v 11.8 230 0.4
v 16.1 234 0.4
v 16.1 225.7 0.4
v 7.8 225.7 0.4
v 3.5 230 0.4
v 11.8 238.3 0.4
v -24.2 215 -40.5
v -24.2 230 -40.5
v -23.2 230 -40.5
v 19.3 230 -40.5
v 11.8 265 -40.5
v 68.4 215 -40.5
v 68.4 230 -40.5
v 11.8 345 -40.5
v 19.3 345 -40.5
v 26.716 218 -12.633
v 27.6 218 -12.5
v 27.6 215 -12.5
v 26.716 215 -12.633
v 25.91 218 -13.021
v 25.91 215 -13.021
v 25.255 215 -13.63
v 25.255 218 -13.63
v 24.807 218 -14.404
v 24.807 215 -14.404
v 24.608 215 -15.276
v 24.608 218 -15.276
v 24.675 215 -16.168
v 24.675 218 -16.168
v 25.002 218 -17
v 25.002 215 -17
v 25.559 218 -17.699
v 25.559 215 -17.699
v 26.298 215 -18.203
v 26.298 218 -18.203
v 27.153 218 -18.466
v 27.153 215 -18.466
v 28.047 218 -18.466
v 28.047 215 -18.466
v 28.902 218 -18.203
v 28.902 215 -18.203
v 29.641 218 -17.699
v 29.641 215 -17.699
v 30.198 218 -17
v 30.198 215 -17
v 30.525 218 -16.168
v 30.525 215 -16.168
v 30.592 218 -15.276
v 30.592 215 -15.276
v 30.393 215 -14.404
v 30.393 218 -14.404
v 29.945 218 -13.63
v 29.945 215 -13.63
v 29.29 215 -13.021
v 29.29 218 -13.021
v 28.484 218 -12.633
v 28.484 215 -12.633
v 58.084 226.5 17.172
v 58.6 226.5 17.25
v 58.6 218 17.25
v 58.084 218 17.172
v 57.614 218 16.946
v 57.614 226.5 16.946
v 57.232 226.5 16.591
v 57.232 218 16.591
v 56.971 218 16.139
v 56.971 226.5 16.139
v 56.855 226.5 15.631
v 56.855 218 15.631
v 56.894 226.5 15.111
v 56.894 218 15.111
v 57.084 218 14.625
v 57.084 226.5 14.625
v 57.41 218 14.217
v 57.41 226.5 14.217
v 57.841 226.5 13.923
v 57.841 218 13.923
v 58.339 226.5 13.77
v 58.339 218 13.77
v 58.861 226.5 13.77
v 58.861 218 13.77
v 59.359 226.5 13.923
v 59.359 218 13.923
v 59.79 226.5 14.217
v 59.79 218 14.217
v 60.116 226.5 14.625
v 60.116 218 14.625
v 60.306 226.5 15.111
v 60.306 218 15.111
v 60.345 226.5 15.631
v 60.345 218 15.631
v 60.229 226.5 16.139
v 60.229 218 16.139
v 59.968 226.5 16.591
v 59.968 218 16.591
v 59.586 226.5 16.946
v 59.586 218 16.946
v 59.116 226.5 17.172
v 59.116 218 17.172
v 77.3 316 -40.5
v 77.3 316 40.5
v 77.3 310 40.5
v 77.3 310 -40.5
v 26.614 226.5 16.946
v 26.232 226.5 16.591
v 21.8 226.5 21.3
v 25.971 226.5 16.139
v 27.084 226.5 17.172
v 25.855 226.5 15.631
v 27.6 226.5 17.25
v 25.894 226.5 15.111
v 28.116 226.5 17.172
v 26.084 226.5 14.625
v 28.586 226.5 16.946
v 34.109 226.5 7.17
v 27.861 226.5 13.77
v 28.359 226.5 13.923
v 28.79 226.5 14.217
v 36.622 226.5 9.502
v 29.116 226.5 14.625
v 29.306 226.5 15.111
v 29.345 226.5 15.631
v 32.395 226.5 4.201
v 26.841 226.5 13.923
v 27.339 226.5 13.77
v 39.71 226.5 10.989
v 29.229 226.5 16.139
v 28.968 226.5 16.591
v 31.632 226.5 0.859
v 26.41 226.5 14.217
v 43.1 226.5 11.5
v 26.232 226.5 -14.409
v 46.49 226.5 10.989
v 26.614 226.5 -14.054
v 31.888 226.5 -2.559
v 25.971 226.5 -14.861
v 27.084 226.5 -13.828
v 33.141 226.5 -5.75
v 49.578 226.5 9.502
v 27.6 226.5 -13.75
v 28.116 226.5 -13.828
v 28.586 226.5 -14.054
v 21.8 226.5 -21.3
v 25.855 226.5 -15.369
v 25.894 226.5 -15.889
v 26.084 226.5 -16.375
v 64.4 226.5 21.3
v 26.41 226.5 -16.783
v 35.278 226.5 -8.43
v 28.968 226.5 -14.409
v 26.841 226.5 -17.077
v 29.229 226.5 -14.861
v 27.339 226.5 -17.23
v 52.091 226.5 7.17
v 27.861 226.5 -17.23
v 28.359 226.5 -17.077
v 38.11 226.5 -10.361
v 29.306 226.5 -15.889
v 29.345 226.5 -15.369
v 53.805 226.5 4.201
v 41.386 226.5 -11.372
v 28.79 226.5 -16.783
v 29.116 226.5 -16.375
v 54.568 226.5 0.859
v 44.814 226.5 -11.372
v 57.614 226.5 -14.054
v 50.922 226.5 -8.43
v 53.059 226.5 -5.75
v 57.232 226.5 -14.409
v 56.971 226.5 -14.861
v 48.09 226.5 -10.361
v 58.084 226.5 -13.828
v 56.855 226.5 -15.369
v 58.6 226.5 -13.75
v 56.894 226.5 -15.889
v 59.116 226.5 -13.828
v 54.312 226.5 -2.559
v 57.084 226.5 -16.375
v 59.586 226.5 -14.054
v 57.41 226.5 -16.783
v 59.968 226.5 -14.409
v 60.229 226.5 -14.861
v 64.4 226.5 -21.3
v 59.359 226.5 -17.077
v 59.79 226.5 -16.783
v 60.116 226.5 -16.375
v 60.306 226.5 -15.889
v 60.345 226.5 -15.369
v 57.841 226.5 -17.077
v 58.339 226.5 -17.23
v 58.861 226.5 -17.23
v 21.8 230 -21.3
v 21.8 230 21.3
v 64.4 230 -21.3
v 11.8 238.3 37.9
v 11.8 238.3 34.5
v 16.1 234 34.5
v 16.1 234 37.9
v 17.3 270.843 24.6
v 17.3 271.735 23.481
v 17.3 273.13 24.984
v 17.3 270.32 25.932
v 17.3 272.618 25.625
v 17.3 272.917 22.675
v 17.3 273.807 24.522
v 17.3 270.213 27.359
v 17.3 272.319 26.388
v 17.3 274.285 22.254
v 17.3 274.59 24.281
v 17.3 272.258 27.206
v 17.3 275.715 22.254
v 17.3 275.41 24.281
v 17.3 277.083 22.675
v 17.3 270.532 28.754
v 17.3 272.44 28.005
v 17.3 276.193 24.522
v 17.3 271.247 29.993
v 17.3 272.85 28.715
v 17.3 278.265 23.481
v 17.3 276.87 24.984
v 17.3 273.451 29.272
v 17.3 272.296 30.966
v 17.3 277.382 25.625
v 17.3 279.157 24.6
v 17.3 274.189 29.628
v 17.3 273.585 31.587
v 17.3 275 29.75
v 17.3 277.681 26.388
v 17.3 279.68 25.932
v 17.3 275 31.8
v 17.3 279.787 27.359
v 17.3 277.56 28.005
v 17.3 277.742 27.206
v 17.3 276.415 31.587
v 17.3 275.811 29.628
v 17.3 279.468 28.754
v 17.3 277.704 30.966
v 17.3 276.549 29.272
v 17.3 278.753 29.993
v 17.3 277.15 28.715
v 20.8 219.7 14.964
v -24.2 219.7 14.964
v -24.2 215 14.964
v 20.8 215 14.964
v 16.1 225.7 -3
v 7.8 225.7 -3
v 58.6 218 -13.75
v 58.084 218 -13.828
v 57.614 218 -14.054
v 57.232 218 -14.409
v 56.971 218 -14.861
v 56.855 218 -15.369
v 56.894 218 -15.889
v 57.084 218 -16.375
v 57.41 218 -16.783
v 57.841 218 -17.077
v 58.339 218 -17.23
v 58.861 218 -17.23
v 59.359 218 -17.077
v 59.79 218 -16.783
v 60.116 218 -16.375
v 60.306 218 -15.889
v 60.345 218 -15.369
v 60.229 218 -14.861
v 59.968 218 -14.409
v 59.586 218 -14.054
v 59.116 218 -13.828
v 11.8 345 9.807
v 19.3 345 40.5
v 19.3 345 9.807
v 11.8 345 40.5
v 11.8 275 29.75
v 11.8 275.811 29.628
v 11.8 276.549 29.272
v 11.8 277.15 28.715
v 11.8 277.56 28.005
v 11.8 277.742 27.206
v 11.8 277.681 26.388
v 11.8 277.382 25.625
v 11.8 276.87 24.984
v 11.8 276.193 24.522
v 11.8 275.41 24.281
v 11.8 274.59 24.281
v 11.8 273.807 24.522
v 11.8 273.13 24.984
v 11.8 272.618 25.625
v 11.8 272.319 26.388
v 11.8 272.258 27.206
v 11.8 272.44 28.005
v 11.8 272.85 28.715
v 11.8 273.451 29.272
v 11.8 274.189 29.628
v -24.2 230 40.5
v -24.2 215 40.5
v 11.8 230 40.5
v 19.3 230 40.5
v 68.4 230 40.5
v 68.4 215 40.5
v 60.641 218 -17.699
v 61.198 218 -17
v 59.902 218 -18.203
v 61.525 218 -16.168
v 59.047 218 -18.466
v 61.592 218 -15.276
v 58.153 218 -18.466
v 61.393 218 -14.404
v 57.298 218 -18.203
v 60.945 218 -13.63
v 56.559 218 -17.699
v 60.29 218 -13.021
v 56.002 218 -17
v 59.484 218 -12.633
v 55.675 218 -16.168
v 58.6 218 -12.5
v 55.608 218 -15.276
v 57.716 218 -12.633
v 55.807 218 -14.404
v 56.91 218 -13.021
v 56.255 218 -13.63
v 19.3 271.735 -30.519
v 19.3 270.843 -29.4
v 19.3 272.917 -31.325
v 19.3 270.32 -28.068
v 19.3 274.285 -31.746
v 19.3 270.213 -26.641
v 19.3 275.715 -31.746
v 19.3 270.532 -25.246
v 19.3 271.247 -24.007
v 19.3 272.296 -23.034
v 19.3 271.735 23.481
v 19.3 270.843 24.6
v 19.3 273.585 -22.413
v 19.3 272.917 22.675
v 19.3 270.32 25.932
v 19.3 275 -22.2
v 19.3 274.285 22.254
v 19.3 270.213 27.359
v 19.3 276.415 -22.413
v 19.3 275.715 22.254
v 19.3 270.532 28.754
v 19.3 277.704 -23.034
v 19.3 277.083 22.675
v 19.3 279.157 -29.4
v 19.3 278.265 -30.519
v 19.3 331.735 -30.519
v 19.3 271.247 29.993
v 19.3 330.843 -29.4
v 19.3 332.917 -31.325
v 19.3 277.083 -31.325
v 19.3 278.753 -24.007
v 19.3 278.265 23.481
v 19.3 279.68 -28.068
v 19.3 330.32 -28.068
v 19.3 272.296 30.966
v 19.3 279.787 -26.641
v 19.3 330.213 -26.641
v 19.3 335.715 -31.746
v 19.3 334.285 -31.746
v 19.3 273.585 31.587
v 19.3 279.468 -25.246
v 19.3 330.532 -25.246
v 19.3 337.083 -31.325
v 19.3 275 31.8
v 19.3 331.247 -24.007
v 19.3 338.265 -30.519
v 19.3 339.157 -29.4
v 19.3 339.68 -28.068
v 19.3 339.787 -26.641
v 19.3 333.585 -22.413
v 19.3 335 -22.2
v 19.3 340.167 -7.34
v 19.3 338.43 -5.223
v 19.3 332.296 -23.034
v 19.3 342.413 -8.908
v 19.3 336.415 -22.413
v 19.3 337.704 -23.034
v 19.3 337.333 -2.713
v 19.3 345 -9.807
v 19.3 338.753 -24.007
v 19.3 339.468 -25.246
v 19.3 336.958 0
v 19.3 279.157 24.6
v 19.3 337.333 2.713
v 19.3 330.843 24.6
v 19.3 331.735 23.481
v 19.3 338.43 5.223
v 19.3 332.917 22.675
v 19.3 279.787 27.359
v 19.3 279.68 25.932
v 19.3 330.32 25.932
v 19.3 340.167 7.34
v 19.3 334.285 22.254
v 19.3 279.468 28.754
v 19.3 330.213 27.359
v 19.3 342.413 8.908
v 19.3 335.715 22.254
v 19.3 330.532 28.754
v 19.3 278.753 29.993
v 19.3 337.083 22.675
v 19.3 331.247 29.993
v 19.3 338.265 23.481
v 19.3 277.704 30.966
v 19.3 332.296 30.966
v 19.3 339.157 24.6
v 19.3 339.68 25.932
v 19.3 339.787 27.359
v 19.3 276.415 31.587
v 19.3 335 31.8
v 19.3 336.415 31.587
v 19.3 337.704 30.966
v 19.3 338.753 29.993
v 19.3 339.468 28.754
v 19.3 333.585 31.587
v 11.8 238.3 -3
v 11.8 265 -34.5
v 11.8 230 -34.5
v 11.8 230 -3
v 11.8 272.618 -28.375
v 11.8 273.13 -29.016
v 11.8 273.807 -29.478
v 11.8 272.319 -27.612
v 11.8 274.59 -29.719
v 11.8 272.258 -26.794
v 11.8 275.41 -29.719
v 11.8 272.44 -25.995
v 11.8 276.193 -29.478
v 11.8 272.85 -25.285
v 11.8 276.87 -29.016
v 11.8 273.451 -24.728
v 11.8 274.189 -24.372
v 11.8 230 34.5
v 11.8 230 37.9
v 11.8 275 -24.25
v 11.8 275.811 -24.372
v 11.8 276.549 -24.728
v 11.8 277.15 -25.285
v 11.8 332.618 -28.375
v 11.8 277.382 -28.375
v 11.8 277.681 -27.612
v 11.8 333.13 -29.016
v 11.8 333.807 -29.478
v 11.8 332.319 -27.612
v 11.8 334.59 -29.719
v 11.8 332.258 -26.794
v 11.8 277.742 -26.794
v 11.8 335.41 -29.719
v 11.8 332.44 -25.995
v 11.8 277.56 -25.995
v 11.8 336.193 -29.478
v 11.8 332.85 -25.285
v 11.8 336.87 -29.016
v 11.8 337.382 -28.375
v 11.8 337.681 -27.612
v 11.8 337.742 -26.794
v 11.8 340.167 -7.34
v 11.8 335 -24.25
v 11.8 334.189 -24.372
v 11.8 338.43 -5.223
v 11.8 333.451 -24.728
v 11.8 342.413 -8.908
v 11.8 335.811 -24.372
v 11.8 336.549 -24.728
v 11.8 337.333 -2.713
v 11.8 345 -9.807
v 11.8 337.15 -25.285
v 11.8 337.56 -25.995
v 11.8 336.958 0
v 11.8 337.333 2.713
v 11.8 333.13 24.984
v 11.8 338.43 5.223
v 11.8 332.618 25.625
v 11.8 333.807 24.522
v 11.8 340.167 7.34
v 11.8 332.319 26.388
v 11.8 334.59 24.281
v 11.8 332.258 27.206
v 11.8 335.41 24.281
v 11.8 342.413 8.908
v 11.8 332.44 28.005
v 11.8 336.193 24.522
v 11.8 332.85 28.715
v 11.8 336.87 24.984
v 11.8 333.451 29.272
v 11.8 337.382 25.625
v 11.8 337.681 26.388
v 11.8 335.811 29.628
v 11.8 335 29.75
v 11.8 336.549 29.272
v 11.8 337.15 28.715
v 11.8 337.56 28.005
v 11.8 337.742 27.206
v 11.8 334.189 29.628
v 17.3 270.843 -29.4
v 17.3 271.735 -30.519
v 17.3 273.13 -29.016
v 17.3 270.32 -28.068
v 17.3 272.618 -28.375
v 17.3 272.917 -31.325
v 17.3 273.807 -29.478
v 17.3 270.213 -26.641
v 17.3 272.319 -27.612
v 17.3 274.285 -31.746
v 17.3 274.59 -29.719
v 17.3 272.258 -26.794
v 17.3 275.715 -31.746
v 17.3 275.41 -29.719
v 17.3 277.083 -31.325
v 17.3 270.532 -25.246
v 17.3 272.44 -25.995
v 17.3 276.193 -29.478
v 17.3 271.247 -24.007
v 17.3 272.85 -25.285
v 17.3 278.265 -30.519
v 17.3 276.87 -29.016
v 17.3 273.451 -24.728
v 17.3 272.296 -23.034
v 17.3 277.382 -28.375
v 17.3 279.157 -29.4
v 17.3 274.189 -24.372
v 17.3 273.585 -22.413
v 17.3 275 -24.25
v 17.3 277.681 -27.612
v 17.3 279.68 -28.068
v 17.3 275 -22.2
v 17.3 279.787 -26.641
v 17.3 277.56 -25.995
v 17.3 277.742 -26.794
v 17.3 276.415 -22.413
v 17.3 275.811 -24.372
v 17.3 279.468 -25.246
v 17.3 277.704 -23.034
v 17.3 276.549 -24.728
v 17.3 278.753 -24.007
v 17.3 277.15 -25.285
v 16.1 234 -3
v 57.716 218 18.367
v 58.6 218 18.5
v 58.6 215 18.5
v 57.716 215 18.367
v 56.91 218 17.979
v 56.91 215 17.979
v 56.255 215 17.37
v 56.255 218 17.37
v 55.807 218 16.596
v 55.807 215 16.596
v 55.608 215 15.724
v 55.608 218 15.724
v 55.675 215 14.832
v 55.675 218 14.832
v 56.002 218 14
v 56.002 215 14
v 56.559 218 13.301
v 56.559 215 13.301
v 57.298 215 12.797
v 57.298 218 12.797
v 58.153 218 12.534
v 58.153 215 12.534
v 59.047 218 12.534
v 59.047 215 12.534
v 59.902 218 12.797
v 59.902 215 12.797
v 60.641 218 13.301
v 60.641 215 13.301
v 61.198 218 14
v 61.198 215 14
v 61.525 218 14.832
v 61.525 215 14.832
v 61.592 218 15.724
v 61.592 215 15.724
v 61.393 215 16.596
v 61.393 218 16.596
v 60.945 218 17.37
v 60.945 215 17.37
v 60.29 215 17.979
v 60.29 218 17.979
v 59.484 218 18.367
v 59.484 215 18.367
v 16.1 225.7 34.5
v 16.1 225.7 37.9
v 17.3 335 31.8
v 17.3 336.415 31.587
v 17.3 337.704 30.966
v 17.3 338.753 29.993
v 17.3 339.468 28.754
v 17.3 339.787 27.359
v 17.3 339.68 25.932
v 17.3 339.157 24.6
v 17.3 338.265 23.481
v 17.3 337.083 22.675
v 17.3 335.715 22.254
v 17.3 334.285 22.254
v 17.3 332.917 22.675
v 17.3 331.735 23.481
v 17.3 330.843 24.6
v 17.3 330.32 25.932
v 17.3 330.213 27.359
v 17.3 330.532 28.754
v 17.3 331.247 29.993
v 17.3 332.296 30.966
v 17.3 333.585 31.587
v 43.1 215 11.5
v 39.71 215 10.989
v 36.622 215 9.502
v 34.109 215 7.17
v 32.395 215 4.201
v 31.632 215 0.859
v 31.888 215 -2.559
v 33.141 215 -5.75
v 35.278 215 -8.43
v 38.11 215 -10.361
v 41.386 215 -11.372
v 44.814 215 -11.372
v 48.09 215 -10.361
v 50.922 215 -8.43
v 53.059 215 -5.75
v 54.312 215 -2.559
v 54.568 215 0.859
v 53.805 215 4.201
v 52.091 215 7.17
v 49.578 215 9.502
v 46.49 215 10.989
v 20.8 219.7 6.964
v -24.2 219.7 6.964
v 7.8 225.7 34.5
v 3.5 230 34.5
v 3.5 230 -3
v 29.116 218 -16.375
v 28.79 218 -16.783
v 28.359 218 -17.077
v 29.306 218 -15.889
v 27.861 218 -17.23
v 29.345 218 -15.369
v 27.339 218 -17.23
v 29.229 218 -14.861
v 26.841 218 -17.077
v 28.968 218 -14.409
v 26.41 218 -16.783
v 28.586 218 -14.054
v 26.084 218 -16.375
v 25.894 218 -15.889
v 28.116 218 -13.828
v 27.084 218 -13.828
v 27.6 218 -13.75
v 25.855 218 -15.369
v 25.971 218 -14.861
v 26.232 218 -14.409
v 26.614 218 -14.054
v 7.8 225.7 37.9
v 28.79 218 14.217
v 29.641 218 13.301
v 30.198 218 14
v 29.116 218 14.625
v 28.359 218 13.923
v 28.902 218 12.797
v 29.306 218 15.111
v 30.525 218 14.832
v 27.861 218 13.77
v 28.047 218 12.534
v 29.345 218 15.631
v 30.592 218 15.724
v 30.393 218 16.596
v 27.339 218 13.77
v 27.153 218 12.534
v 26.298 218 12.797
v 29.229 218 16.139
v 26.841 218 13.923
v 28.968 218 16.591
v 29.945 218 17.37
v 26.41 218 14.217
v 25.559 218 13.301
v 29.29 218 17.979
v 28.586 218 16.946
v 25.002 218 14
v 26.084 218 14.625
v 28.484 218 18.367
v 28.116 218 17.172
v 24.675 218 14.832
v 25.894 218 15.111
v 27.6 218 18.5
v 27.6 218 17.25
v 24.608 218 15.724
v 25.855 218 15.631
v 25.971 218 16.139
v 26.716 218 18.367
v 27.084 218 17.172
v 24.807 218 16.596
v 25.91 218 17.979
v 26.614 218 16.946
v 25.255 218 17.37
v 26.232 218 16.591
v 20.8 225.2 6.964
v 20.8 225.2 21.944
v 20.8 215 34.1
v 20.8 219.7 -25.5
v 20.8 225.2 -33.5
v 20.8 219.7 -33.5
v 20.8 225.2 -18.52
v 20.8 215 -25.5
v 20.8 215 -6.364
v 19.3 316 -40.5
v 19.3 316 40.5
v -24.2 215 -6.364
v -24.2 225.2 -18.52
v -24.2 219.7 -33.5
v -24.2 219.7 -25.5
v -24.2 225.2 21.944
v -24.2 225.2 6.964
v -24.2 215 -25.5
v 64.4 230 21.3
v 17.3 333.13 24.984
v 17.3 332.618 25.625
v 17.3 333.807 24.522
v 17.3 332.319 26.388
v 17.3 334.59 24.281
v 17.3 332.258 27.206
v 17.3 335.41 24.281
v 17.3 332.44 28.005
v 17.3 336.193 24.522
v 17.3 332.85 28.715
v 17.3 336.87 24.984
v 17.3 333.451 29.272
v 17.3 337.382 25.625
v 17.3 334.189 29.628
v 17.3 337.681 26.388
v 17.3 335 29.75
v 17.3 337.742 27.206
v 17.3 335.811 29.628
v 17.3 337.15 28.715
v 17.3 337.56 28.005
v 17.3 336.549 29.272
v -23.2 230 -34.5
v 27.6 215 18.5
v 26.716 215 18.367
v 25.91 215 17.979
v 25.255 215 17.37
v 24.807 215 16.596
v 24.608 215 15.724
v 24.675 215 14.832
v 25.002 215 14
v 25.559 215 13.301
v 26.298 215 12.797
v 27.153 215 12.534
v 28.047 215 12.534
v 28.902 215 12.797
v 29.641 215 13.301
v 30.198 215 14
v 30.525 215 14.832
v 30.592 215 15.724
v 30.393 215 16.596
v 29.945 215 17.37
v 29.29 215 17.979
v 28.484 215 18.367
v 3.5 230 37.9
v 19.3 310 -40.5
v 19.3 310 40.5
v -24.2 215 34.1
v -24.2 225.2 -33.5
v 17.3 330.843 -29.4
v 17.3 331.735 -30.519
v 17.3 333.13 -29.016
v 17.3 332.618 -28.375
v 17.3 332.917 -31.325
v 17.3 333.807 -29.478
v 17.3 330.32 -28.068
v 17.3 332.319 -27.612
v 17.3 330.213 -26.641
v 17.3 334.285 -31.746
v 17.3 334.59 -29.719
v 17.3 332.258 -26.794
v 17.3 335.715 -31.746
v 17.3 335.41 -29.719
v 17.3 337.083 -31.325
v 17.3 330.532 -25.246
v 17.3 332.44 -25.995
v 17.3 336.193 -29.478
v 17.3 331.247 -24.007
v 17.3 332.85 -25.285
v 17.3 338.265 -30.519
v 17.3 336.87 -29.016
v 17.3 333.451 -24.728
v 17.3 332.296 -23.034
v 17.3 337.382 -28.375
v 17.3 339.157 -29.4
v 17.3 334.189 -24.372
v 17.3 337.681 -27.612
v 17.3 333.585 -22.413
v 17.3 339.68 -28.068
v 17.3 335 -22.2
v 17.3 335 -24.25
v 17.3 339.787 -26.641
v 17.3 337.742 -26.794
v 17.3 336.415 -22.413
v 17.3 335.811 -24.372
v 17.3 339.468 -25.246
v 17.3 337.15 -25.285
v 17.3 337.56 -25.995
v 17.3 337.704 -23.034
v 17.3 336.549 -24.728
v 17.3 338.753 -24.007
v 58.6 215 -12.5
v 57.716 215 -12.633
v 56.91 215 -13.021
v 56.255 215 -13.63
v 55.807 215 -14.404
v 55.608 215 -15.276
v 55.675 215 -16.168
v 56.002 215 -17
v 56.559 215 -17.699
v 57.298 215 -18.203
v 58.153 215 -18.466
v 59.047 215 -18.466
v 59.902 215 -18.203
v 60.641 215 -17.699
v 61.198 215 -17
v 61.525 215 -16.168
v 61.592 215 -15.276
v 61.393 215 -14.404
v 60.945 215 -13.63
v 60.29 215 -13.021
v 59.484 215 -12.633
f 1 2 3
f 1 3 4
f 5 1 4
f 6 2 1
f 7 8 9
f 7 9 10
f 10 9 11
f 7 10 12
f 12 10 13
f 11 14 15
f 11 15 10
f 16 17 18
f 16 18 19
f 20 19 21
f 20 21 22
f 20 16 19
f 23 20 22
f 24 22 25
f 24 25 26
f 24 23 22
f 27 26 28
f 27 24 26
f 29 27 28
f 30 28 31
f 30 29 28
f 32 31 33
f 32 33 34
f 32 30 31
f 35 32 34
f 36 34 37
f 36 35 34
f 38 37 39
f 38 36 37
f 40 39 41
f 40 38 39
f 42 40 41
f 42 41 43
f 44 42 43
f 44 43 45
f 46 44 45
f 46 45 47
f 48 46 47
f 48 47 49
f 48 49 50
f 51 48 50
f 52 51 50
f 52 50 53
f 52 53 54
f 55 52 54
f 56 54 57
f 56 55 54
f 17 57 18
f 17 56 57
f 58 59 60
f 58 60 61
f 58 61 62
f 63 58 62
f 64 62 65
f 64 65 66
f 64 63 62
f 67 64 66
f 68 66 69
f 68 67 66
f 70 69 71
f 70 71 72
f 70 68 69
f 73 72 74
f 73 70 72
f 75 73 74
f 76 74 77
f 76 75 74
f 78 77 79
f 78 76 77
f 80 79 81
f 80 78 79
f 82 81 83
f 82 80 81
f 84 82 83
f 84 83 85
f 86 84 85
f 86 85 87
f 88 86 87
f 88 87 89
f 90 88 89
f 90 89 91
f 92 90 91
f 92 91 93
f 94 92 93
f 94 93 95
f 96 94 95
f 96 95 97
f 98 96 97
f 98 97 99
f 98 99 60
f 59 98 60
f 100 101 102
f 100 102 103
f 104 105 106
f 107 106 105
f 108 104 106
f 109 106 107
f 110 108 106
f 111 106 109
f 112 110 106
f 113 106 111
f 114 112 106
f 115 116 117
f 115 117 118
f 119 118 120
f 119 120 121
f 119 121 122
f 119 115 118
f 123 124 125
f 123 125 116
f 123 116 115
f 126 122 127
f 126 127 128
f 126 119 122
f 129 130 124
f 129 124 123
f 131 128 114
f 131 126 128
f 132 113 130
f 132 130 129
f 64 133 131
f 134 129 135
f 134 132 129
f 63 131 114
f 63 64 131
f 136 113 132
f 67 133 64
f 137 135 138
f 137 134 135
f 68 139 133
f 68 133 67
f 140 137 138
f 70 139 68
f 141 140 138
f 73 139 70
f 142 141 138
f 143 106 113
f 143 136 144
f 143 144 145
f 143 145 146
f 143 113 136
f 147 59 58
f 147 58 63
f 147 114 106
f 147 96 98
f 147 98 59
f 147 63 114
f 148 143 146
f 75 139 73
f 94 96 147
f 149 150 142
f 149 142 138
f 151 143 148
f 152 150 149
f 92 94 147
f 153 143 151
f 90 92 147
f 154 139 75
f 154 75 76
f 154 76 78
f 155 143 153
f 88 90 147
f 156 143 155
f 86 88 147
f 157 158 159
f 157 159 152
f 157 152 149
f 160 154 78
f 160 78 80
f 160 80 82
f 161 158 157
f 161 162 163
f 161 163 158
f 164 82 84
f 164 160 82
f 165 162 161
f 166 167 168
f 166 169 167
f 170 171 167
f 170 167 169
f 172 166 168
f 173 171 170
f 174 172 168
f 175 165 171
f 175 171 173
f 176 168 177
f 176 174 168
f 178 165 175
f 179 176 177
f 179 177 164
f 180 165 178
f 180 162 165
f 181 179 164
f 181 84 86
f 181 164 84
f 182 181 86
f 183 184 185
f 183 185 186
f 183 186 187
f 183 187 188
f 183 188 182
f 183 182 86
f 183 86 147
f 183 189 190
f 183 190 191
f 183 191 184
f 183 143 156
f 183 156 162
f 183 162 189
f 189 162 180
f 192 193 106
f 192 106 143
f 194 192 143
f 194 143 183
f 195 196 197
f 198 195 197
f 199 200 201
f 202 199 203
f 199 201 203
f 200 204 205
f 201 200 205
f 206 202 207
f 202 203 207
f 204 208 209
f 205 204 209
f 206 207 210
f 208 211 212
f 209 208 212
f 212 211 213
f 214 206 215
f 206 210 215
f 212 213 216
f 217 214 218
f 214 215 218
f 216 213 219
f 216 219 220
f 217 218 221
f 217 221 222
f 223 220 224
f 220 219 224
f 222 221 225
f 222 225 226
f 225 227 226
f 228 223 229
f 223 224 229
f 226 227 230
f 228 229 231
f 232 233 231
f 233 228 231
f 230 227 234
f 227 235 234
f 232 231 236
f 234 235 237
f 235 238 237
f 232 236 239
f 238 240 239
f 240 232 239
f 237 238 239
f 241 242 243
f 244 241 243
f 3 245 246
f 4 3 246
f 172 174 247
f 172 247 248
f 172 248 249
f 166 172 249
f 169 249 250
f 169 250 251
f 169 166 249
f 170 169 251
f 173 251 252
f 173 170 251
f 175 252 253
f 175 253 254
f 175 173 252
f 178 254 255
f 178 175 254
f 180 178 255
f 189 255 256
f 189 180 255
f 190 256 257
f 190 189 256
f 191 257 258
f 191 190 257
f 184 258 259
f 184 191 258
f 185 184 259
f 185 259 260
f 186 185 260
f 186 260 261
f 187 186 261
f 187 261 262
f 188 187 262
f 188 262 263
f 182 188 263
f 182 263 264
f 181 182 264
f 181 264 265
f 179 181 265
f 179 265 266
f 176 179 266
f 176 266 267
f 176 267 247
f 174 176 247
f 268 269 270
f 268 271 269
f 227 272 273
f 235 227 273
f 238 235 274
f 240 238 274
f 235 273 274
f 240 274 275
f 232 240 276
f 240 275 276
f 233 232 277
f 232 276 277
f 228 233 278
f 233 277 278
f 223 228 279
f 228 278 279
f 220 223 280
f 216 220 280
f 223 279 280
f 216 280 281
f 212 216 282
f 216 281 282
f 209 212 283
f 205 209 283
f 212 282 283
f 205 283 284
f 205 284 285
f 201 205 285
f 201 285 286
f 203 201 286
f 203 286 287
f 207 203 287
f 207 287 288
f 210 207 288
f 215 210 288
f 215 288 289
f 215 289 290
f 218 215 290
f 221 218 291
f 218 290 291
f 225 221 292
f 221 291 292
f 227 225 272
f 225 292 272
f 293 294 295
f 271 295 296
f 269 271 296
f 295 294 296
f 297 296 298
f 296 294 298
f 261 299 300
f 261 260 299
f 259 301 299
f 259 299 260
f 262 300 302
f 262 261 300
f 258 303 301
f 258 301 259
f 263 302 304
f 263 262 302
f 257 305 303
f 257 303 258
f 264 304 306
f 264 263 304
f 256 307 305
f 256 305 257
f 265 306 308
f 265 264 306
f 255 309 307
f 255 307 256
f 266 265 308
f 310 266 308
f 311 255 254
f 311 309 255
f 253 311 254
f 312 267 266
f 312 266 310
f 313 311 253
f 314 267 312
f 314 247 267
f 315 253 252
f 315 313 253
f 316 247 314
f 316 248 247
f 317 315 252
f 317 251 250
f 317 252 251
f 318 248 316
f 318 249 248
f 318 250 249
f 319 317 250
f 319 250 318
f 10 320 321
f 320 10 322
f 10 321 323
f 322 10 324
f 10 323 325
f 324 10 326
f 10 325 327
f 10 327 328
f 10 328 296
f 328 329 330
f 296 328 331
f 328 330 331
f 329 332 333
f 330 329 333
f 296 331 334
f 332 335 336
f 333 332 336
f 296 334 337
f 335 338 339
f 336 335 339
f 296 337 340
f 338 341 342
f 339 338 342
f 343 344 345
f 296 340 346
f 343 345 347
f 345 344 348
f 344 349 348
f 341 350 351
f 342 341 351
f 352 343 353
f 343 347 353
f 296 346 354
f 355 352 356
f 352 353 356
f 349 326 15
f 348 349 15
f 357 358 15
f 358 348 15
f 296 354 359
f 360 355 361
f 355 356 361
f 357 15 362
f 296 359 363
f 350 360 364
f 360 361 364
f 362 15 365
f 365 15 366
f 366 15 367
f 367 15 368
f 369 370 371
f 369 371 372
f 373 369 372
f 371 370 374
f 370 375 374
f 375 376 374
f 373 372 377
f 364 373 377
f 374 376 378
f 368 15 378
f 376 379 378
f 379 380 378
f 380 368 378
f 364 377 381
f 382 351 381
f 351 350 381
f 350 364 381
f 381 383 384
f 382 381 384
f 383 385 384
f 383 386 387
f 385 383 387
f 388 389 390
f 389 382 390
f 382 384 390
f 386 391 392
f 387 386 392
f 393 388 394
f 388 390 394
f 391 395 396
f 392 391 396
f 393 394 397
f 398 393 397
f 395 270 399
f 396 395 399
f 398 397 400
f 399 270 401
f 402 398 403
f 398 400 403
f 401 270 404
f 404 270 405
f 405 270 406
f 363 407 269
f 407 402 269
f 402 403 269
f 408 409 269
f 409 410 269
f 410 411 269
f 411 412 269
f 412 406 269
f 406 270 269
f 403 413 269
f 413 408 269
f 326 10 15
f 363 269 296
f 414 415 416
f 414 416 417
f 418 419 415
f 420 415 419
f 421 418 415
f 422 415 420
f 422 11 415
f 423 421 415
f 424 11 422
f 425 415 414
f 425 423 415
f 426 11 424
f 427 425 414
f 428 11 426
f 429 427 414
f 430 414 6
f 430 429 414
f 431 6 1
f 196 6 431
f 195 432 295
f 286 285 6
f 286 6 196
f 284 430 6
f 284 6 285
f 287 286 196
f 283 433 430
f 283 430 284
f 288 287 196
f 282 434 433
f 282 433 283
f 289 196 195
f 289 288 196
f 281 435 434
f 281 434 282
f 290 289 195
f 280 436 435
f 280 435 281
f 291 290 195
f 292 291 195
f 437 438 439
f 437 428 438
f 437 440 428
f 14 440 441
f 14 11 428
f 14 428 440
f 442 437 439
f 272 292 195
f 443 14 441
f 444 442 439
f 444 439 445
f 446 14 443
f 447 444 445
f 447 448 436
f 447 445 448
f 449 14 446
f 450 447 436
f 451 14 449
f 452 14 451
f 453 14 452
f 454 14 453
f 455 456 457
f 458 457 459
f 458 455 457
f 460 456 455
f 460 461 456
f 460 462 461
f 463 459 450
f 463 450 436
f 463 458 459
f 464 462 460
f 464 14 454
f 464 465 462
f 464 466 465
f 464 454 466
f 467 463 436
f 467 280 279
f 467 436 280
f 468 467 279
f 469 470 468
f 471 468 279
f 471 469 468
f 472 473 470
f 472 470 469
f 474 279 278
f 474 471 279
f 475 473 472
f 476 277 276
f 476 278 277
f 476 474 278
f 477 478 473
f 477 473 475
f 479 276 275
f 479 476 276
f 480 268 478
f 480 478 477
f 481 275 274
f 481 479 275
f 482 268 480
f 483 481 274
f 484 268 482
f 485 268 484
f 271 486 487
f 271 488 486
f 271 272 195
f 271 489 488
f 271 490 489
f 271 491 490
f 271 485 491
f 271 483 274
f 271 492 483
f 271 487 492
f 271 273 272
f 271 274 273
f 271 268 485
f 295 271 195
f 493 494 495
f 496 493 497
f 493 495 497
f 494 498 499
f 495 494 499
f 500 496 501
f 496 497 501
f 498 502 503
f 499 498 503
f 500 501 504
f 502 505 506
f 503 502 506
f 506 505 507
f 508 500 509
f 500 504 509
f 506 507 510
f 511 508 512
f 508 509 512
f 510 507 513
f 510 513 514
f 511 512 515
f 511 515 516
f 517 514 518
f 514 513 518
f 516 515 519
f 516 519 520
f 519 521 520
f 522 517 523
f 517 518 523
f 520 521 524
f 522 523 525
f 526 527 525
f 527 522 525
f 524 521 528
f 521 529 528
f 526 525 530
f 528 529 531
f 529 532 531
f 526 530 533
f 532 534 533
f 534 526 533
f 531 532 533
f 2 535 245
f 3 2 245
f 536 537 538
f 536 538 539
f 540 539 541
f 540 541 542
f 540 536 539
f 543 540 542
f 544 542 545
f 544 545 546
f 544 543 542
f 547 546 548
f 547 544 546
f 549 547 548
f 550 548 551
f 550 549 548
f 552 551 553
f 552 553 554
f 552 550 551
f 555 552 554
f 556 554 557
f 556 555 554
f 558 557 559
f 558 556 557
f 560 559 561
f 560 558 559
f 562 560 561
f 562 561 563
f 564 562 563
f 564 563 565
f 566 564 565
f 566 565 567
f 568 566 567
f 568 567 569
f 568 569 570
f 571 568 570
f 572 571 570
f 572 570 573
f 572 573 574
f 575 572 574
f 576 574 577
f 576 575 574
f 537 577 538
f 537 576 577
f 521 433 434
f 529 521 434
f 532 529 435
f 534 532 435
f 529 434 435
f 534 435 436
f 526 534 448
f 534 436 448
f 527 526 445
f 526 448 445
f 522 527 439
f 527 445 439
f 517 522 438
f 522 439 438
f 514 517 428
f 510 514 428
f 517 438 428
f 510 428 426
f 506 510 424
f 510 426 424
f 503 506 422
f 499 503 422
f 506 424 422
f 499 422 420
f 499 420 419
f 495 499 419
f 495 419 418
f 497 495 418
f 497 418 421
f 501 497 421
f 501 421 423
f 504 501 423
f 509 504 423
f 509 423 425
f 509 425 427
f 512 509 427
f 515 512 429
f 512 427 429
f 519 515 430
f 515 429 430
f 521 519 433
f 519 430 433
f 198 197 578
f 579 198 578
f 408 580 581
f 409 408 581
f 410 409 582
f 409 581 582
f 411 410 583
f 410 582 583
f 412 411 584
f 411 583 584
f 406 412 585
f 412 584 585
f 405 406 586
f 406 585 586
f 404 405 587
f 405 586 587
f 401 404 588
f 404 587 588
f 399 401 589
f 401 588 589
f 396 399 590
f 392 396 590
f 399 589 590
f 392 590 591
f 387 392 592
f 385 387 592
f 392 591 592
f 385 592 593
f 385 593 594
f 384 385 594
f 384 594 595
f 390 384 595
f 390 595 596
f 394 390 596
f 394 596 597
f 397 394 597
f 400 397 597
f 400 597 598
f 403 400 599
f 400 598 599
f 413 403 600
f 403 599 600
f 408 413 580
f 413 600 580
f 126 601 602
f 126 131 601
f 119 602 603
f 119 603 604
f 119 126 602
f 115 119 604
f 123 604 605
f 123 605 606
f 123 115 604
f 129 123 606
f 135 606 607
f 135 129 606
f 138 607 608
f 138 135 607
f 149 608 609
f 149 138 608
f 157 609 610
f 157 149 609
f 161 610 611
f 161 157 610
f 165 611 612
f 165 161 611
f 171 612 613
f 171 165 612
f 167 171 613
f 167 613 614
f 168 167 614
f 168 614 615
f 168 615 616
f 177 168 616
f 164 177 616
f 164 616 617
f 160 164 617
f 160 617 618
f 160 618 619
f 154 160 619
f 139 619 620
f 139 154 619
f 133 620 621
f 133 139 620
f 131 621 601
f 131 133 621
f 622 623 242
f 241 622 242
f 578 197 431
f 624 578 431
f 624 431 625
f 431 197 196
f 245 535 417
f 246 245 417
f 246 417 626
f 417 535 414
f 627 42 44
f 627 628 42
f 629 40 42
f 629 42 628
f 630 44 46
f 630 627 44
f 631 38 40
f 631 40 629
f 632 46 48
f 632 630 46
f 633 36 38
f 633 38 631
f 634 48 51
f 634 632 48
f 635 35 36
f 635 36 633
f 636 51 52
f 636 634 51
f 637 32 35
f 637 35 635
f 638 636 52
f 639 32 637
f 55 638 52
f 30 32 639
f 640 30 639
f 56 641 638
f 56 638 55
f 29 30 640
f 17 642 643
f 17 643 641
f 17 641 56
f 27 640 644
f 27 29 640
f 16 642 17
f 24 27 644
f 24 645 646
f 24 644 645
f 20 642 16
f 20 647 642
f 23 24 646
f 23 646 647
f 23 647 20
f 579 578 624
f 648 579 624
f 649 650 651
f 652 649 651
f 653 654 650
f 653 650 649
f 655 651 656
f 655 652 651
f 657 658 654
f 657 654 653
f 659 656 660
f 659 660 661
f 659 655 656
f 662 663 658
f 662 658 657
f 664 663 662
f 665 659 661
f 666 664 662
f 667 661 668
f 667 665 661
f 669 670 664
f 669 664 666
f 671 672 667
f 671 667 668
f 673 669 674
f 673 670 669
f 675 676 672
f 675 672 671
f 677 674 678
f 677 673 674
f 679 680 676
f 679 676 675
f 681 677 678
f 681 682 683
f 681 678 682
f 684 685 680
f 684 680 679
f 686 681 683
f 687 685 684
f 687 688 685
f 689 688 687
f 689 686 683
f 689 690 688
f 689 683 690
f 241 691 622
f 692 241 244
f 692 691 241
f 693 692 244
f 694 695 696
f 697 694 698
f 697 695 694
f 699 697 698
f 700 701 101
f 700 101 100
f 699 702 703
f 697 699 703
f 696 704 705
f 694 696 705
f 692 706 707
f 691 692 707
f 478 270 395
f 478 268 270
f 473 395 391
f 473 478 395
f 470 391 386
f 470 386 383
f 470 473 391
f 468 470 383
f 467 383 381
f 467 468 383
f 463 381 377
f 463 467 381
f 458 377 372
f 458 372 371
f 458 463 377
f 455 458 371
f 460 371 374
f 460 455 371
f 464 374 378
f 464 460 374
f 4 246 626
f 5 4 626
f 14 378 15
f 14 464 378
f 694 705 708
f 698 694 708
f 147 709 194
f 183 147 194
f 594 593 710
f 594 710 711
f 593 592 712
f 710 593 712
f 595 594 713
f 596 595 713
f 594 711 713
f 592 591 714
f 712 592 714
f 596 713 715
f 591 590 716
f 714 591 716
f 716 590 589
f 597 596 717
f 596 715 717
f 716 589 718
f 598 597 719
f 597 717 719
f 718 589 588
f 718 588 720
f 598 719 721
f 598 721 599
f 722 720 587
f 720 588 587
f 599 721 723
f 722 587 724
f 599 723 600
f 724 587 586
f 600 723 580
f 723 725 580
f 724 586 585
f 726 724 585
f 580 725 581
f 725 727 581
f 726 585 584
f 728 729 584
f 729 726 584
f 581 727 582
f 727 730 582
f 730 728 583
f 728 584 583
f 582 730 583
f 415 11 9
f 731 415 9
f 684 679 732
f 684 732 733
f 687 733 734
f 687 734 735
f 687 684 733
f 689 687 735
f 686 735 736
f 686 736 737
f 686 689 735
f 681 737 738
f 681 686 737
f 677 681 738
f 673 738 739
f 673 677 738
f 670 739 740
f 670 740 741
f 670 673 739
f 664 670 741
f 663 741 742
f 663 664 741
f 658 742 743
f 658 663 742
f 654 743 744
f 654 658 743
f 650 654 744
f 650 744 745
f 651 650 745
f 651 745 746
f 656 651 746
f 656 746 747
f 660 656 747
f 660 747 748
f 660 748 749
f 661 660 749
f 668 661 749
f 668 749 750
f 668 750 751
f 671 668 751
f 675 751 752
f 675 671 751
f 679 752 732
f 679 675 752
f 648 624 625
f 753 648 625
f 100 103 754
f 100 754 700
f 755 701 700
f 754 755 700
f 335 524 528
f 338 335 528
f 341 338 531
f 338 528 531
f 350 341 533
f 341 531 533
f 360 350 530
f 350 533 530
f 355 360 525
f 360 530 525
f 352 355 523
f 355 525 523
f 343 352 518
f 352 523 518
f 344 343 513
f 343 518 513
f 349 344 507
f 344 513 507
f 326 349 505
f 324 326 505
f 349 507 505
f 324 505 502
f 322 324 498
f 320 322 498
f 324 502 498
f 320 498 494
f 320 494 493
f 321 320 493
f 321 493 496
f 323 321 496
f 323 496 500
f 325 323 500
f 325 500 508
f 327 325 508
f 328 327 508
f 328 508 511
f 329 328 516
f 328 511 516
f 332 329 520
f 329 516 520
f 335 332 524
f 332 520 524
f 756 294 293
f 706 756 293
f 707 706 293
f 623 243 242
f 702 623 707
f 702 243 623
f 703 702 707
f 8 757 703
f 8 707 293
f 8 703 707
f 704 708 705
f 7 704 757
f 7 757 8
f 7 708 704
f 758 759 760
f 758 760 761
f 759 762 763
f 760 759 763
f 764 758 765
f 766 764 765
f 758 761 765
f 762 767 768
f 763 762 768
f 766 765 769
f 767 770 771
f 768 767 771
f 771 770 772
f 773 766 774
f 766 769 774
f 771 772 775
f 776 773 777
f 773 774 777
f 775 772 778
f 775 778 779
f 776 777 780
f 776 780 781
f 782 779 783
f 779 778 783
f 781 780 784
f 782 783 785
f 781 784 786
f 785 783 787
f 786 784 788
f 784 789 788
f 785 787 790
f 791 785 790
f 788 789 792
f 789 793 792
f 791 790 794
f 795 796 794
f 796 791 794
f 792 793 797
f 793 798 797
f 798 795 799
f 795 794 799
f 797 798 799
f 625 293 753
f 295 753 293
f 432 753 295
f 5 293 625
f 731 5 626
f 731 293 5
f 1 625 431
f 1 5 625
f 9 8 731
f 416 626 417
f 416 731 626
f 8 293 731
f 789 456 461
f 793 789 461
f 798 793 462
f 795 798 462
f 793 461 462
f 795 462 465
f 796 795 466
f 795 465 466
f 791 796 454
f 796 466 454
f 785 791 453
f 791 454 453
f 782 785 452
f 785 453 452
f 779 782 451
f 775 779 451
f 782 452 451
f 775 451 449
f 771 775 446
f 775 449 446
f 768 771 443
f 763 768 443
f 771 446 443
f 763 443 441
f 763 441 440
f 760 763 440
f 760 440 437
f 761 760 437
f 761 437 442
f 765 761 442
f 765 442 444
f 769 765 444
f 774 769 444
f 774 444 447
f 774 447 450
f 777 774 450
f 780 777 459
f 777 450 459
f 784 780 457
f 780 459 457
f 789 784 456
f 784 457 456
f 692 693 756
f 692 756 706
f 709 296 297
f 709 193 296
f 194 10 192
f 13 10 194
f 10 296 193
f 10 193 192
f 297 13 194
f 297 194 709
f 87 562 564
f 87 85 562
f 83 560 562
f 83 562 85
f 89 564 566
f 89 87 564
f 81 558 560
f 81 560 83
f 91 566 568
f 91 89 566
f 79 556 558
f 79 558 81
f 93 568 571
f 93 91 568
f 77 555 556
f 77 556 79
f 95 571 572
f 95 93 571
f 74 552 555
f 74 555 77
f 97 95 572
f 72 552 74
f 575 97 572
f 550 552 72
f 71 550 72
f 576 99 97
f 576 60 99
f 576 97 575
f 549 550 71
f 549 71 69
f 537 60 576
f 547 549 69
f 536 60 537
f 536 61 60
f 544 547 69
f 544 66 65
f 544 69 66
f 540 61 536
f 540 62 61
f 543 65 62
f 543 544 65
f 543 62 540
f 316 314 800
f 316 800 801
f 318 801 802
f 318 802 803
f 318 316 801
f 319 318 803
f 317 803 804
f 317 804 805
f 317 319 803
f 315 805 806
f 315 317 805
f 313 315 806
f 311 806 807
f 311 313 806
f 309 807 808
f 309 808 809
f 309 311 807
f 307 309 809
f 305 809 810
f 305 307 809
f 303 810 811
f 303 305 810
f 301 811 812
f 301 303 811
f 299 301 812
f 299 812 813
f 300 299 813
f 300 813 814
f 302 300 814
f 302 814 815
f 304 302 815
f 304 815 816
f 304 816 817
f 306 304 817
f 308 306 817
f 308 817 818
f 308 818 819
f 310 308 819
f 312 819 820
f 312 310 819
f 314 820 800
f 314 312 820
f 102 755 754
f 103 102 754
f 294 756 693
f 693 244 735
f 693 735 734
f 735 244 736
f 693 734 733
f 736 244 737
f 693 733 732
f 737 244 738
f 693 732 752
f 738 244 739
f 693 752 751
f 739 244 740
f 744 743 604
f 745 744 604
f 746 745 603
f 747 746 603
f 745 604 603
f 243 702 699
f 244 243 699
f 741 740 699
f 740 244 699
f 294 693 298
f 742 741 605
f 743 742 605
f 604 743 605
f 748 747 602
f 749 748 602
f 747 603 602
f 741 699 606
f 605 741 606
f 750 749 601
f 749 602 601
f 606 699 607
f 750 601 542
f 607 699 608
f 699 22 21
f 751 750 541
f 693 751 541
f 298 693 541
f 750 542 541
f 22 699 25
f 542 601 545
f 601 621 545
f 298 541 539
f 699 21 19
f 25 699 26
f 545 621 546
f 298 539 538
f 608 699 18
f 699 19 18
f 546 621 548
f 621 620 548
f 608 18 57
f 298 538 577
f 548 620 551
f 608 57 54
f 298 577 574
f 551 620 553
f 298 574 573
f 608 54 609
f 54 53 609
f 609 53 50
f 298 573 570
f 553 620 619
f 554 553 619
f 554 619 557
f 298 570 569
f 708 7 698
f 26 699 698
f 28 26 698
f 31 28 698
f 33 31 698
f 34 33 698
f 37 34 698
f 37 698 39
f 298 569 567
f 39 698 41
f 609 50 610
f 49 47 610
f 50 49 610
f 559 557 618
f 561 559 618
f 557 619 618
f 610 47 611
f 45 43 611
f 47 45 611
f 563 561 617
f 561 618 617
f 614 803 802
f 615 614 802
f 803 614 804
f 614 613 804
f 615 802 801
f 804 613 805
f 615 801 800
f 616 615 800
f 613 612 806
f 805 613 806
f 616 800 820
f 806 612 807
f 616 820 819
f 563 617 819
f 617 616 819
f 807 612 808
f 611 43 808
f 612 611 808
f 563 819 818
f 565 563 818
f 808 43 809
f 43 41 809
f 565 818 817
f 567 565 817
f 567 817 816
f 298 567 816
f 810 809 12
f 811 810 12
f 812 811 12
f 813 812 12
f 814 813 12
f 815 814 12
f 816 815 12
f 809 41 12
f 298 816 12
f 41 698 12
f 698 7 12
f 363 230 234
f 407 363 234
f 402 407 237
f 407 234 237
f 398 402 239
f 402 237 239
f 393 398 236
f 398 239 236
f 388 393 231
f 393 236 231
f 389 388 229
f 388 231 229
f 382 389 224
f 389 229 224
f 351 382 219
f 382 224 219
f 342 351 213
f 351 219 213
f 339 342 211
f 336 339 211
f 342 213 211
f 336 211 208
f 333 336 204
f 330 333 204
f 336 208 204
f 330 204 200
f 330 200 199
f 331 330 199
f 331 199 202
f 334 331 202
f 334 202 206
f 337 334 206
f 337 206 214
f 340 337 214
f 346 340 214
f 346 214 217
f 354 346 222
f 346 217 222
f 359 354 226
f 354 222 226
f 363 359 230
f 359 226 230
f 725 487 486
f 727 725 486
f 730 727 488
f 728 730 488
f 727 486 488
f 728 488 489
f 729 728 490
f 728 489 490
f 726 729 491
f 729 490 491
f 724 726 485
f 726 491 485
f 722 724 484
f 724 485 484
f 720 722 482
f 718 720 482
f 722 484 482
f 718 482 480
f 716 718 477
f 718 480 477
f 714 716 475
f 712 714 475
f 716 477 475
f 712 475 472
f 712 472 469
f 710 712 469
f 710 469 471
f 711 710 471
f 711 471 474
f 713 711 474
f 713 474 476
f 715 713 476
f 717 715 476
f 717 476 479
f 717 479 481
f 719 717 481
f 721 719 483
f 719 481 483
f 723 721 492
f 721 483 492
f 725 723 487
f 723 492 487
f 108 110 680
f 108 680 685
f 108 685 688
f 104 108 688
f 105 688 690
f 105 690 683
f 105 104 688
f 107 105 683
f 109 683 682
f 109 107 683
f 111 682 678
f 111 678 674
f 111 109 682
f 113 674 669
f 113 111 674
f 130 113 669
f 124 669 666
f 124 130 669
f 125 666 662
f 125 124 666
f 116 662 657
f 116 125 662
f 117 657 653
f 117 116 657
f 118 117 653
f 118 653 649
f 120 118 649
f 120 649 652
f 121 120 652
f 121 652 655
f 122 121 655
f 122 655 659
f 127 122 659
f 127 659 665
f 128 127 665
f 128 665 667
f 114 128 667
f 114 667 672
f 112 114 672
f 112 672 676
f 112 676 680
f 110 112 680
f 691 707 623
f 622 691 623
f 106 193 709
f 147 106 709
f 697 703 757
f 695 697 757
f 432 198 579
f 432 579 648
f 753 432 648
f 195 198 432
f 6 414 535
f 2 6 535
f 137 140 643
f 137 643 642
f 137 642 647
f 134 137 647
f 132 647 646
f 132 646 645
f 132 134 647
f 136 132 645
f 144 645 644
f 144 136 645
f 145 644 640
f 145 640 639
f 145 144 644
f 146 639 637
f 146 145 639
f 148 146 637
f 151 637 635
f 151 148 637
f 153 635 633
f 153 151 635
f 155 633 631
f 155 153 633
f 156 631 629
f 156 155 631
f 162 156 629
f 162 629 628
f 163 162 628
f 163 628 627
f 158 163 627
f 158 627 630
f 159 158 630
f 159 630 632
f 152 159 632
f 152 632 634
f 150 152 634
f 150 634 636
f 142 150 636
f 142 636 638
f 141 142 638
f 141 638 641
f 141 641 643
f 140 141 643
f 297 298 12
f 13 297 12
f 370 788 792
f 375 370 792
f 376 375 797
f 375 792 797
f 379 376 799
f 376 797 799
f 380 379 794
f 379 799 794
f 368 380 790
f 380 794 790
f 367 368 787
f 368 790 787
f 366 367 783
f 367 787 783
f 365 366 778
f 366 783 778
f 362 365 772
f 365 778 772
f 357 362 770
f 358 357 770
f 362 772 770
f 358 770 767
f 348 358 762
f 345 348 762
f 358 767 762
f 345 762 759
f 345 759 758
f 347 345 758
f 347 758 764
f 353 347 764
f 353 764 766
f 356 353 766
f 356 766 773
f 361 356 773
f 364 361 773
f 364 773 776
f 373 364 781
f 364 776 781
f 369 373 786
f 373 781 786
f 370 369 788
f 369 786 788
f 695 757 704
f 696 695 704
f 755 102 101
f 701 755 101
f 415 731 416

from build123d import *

# Parameters (mm, degrees)
SKETCH1_W               = 56.4
SKETCH1_H               = 67
SKETCH1_W_2             = 46.4
SKETCH1_H_2             = 55
BOSS_EXTRUDE1_DEPTH     = 14
SKETCH4_W               = 12
SKETCH4_H               = 12
BOSS_EXTRUDE2_DEPTH     = 200
SKETCH16_W              = 4.6
SKETCH16_H              = 14
BOSS_EXTRUDE11_DEPTH    = 43
SKETCH5_W               = 5
SKETCH5_H               = 67
BOSS_EXTRUDE3_DEPTH     = 14
BOSS_EXTRUDE4_REACH     = 216.011
SKETCH2_R               = 2.75
CUT_EXTRUDE1_DEPTH      = 5
SKETCH3_R               = 2.75
CUT_EXTRUDE2_DEPTH      = 210.198972273
SKETCH7_R               = 2.75
CUT_EXTRUDE3_DEPTH      = 217.851100989
SKETCH8_W               = 8
SKETCH8_H               = 14
BOSS_EXTRUDE5_DEPTH     = 1
SKETCH9_W               = 92.6
SKETCH9_H               = 81
SKETCH9_W_2             = 6.786539707
BOSS_EXTRUDE6_DEPTH     = 15
SKETCH10_W              = 42.6
SKETCH10_H              = 42.6
CUT_EXTRUDE4_DEPTH      = 3.5
SKETCH11_R              = 1.75
SKETCH11_R_2            = 11.5
CUT_EXTRUDE5_DEPTH      = 11.5
CUT_EXTRUDE6_START      = 8.5
SKETCH11_5_R            = 3
SKETCH11_5_R_2          = 1.75
SKETCH11_5_R_3          = 11.5
CUT_EXTRUDE6_DEPTH      = 3
SKETCH13_R              = 2.75
BOSS_EXTRUDE7_DEPTH     = 5.5
BOSS_EXTRUDE10_START    = -5.5
SKETCH13_3_R            = 4.8
BOSS_EXTRUDE10_DEPTH    = 2
SKETCH15_W              = 81
SKETCH15_H              = 6
BOSS_EXTRUDE9_DEPTH     = 58
SKETCH17_W              = 159.404685439
SKETCH17_H              = 222.014649432
CUT_EXTRUDE7_DEPTH      = 362.894321591
CUT_EXTRUDE7_DEPTH_BACK = 362.894321591
CUT_EXTRUDE8_DEPTH      = 45
BOSS_EXTRUDE13_DEPTH    = 6
CUT_EXTRUDE9_START      = -6
CUT_EXTRUDE9_DEPTH      = 3.4
CUT_EXTRUDE10_START     = -43.5
CUT_EXTRUDE10_DEPTH     = 3.4


with BuildPart() as part:
    # Sketch1 → Boss-Extrude1 (new body)
    with BuildSketch(Plane(origin=(0, 0, 0), x_dir=(1, 0, 0), z_dir=(0, 1, 0))):
        Rectangle(SKETCH1_W, SKETCH1_H)
        Rectangle(SKETCH1_W_2, SKETCH1_H_2, mode=Mode.SUBTRACT)
    extrude(amount=BOSS_EXTRUDE1_DEPTH)

    # Sketch4 → Boss-Extrude2 (add)
    with BuildSketch(Plane(origin=(0, 0, 0), x_dir=(1, 0, 0), z_dir=(0, 1, 0))):
        with Locations((-34.2, -27.5)):
            Rectangle(SKETCH4_W, SKETCH4_H)
        with Locations((-34.2, 27.5)):
            Rectangle(SKETCH4_W, SKETCH4_H)
    extrude(amount=BOSS_EXTRUDE2_DEPTH)

    # Sketch16 → Boss-Extrude11 (add)
    with BuildSketch(Plane.XY.offset(-21.5)):
        with Locations((-30.5, 7)):
            Rectangle(SKETCH16_W, SKETCH16_H)
    extrude(amount=BOSS_EXTRUDE11_DEPTH)

    # Sketch5 → Boss-Extrude3 (add)
    with BuildSketch(Plane(origin=(0, 200, 0), x_dir=(1, 0, 0), z_dir=(0, 1, 0))):
        with Locations((-25.7, 0)):
            Rectangle(SKETCH5_W, SKETCH5_H)
    extrude(amount=-BOSS_EXTRUDE3_DEPTH)

    # Boss-Extrude4: up to this face of the body (flat: up to its plane)
    boss_extrude4_end = Plane(part.part.faces().sort_by_distance((-28.2, 100, 27.5))[0])
    # Sketch6 → Boss-Extrude4 (add, up to the picked face)
    with BuildSketch(Plane.ZY.offset(40.2), mode=Mode.PRIVATE) as boss_extrude4_sk1:
        Polygon((21.5, 157.410301507), (-21.5, 186), (-21.5, 171.589698493), (21.5, 143), align=None)
    boss_extrude4_tool1 = split(extrude(boss_extrude4_sk1.sketch, amount=-BOSS_EXTRUDE4_REACH, mode=Mode.PRIVATE), bisect_by=boss_extrude4_end, keep=Keep.BOTH, mode=Mode.PRIVATE)
    # Sketch6 → Boss-Extrude4 (add, up to the picked face)
    with BuildSketch(Plane.ZY.offset(40.2), mode=Mode.PRIVATE) as boss_extrude4_sk2:
        Polygon((21.5, 128.589698493), (21.5, 143), (-21.5, 114.410301507), (-21.5, 100), align=None)
    boss_extrude4_tool2 = split(extrude(boss_extrude4_sk2.sketch, amount=-BOSS_EXTRUDE4_REACH, mode=Mode.PRIVATE), bisect_by=boss_extrude4_end, keep=Keep.BOTH, mode=Mode.PRIVATE)
    # Sketch6 → Boss-Extrude4 (add, up to the picked face)
    with BuildSketch(Plane.ZY.offset(40.2), mode=Mode.PRIVATE) as boss_extrude4_sk3:
        Polygon((21.5, 71.410301507), (-21.5, 100), (-21.5, 85.589698493), (21.5, 57), align=None)
    boss_extrude4_tool3 = split(extrude(boss_extrude4_sk3.sketch, amount=-BOSS_EXTRUDE4_REACH, mode=Mode.PRIVATE), bisect_by=boss_extrude4_end, keep=Keep.BOTH, mode=Mode.PRIVATE)
    # Sketch6 → Boss-Extrude4 (add, up to the picked face)
    with BuildSketch(Plane.ZY.offset(40.2), mode=Mode.PRIVATE) as boss_extrude4_sk4:
        Polygon((21.5, 42.589698493), (21.5, 57), (-21.5, 28.410301507), (-21.5, 14), align=None)
    boss_extrude4_tool4 = split(extrude(boss_extrude4_sk4.sketch, amount=-BOSS_EXTRUDE4_REACH, mode=Mode.PRIVATE), bisect_by=boss_extrude4_end, keep=Keep.BOTH, mode=Mode.PRIVATE)
    add(boss_extrude4_tool1.solids().sort_by(Axis((-40.2, 164.5, 0), (1, 0, 0)))[0])
    add(boss_extrude4_tool2.solids().sort_by(Axis((-40.2, 121.5, 0), (1, 0, 0)))[0])
    add(boss_extrude4_tool3.solids().sort_by(Axis((-40.2, 78.5, 0), (1, 0, 0)))[0])
    add(boss_extrude4_tool4.solids().sort_by(Axis((-40.2, 35.5, 0), (1, 0, 0)))[0])

    # Sketch2 → Cut-Extrude1 (cut)
    with BuildSketch(Plane(origin=(28.2, 0, 0), x_dir=(0, 0, -1), z_dir=(1, 0, 0))):
        with Locations((-20.75, 7)):
            Circle(SKETCH2_R)
        with Locations((20.75, 7)):
            Circle(SKETCH2_R)
    extrude(amount=-CUT_EXTRUDE1_DEPTH, mode=Mode.SUBTRACT)

    # Sketch3 → Cut-Extrude2 (cut, through all)
    with BuildSketch(Plane(origin=(-23.2, 0, 0), x_dir=(0, 0, -1), z_dir=(1, 0, 0))):
        with Locations((15.85, 7)):
            Circle(SKETCH3_R)
        with Locations((-15.85, 7)):
            Circle(SKETCH3_R)
    extrude(amount=-CUT_EXTRUDE2_DEPTH, mode=Mode.SUBTRACT)

    # Sketch7 → Cut-Extrude3 (cut, through all)
    with BuildSketch(Plane(origin=(-23.2, 0, -32.7), x_dir=(0, 0, -1), z_dir=(1, 0, 0))):
        with Locations((-16.85, 193)):
            Circle(SKETCH7_R)
        with Locations((-48.55, 193)):
            Circle(SKETCH7_R)
    extrude(amount=-CUT_EXTRUDE3_DEPTH, mode=Mode.SUBTRACT)

    # Sketch8 → Boss-Extrude5 (add)
    with BuildSketch(Plane(origin=(-23.2, 0, 0), x_dir=(0, 0, -1), z_dir=(1, 0, 0))):
        with Locations((-29.5, 193)):
            Rectangle(SKETCH8_W, SKETCH8_H)
        with Locations((29.5, 193)):
            Rectangle(SKETCH8_W, SKETCH8_H)
    extrude(amount=BOSS_EXTRUDE5_DEPTH)

    # Sketch17 → Cut-Extrude7 (cut, two sides)
    with BuildSketch(Plane.ZY.offset(24.2)) as cut_extrude7_sk:
        with Locations((0.680677332, 96.663888991)):
            Rectangle(SKETCH17_W, SKETCH17_H)
    extrude(amount=CUT_EXTRUDE7_DEPTH, mode=Mode.SUBTRACT)
    extrude(cut_extrude7_sk.sketch, amount=-CUT_EXTRUDE7_DEPTH_BACK, mode=Mode.SUBTRACT)


with BuildPart() as body_2:
    # Sketch9 → Boss-Extrude6 (new body)
    with BuildSketch(Plane(origin=(0, 215, 0), x_dir=(1, 0, 0), z_dir=(0, 1, 0))):
        with Locations((22.1, 0)):
            Rectangle(SKETCH9_W, SKETCH9_H)
        with Locations((-18.806730147, 0)):
            Rectangle(SKETCH9_W_2, SKETCH9_H)
    extrude(amount=BOSS_EXTRUDE6_DEPTH)

    # Sketch10 → Cut-Extrude4 (cut)
    with BuildSketch(Plane(origin=(0, 230, 0), x_dir=(1, 0, 0), z_dir=(0, 1, 0))):
        with Locations((43.1, 0)):
            Rectangle(SKETCH10_W, SKETCH10_H)
    extrude(amount=-CUT_EXTRUDE4_DEPTH, mode=Mode.SUBTRACT)

    # Sketch11 → Cut-Extrude5 (cut)
    with BuildSketch(Plane(origin=(0, 226.5, -221.5), x_dir=(1, 0, 0), z_dir=(0, -1, 0))):
        with Locations(Location((58.6, 237, 0), (0, 0, 90))):
            Circle(SKETCH11_R)
        with Locations(Location((27.6, 237, 0), (0, 0, 90))):
            Circle(SKETCH11_R)
        with Locations(Location((27.6, 206, 0), (0, 0, 90))):
            Circle(SKETCH11_R)
        with Locations(Location((58.6, 206, 0), (0, 0, 90))):
            Circle(SKETCH11_R)
        with Locations(Location((43.1, 221.5, 0), (0, 0, 90))):
            Circle(SKETCH11_R_2)
    extrude(amount=CUT_EXTRUDE5_DEPTH, mode=Mode.SUBTRACT)

    # Sketch11<5> → Cut-Extrude6 (cut)
    with BuildSketch(Plane(origin=(0, 226.5, -221.5), x_dir=(1, 0, 0), z_dir=(0, -1, 0)).offset(CUT_EXTRUDE6_START)):
        with Locations(Location((27.6, 237, 0), (0, 0, 90))):
            Circle(SKETCH11_5_R)
        with Locations(Location((27.6, 237, 0), (0, 0, 90))):
            Circle(SKETCH11_5_R_2, mode=Mode.SUBTRACT)
        with Locations(Location((58.6, 237, 0), (0, 0, 90))):
            Circle(SKETCH11_5_R)
        with Locations(Location((58.6, 237, 0), (0, 0, 90))):
            Circle(SKETCH11_5_R_2, mode=Mode.SUBTRACT)
        with Locations(Location((58.6, 206, 0), (0, 0, 90))):
            Circle(SKETCH11_5_R)
        with Locations(Location((58.6, 206, 0), (0, 0, 90))):
            Circle(SKETCH11_5_R_2, mode=Mode.SUBTRACT)
        with Locations(Location((27.6, 206, 0), (0, 0, 90))):
            Circle(SKETCH11_5_R)
        with Locations(Location((27.6, 206, 0), (0, 0, 90))):
            Circle(SKETCH11_5_R_2, mode=Mode.SUBTRACT)
        with Locations(Location((43.1, 221.5, 0), (0, 0, 90))):
            Circle(SKETCH11_5_R_3)
    extrude(amount=CUT_EXTRUDE6_DEPTH, mode=Mode.SUBTRACT)

    # Sketch18 → Cut-Extrude8 (cut)
    with BuildSketch(Plane.ZY.offset(24.2)):
        Polygon((-18.519847466, 225.2), (-33.5, 225.2), (-33.5, 219.7), (-25.5, 219.7), (-25.5, 215), (-6.363960821, 215), align=None)
        Polygon((14.963960821, 219.7), (14.963960821, 215), (34.1, 215), (21.944113356, 225.2), (6.963960821, 225.2), (6.963960821, 219.7), align=None)
    extrude(amount=-CUT_EXTRUDE8_DEPTH, mode=Mode.SUBTRACT)



with BuildPart() as body_3:
    # Sketch13 → Boss-Extrude7 (new body)
    with BuildSketch(Plane.ZY.offset(-11.8)):
        with BuildLine():
            Line((-9.806532844, 345), (-40.5, 345))
            Line((-40.5, 345), (-40.5, 230))
            Line((-40.5, 230), (40.5, 230))
            Line((40.5, 230), (40.5, 345))
            Line((40.5, 345), (9.806532844, 345))
            ThreePointArc((9.806532844, 345), (0, 336.957527416), (-9.806532844, 345))
        make_face()
        with Locations((-27, 275)):
            Circle(SKETCH13_R, mode=Mode.SUBTRACT)
        with Locations((27, 335)):
            Circle(SKETCH13_R, mode=Mode.SUBTRACT)
        with Locations((27, 275)):
            Circle(SKETCH13_R, mode=Mode.SUBTRACT)
        with Locations((-27, 335)):
            Circle(SKETCH13_R, mode=Mode.SUBTRACT)
    extrude(amount=-BOSS_EXTRUDE7_DEPTH)

    # Sketch13<3> → Boss-Extrude10 (add)
    with BuildSketch(Plane.ZY.offset(-11.8).offset(BOSS_EXTRUDE10_START)):
        with BuildLine():
            Line((-9.806532844, 345), (-40.5, 345))
            Line((-40.5, 345), (-40.5, 230))
            Line((-40.5, 230), (40.5, 230))
            Line((40.5, 230), (40.5, 345))
            Line((40.5, 345), (9.806532844, 345))
            ThreePointArc((9.806532844, 345), (0, 336.957527416), (-9.806532844, 345))
        make_face()
        with Locations((-27, 275)):
            Circle(SKETCH13_3_R, mode=Mode.SUBTRACT)
        with Locations((27, 275)):
            Circle(SKETCH13_3_R, mode=Mode.SUBTRACT)
        with Locations((-27, 335)):
            Circle(SKETCH13_3_R, mode=Mode.SUBTRACT)
        with Locations((27, 335)):
            Circle(SKETCH13_3_R, mode=Mode.SUBTRACT)
    extrude(amount=-BOSS_EXTRUDE10_DEPTH)


with BuildPart() as body_4:
    # Sketch15 → Boss-Extrude9 (new body)
    with BuildSketch(Plane(origin=(19.3, 0, 0), x_dir=(0, 0, -1), z_dir=(1, 0, 0))):
        with Locations((0, 313)):
            Rectangle(SKETCH15_W, SKETCH15_H)
    extrude(amount=BOSS_EXTRUDE9_DEPTH)


with BuildPart() as body_2_1:
    add(body_2.part)

    add(body_3.part)  # Boss-Extrude13 merges body 3
    # Sketch19 → Boss-Extrude13 (add)
    with BuildSketch(Plane(origin=(0, 0, -40.5), x_dir=(-1, 0, 0), z_dir=(0, 0, -1))):
        Polygon((-11.8, 265), (23.2, 230), (-11.8, 230), align=None)
    extrude(amount=-BOSS_EXTRUDE13_DEPTH)

    # Sketch21 → Cut-Extrude9 (cut)
    with BuildSketch(Plane.XY.offset(40.5).offset(CUT_EXTRUDE9_START)):
        Polygon((11.8, 238.3), (16.1, 234), (16.1, 225.7), (7.8, 225.7), (3.5, 230), (11.8, 230), align=None)
    extrude(amount=CUT_EXTRUDE9_DEPTH, mode=Mode.SUBTRACT)

    # Sketch21<2> → Cut-Extrude10 (cut)
    with BuildSketch(Plane.XY.offset(40.5).offset(CUT_EXTRUDE10_START)):
        Polygon((11.8, 238.3), (16.1, 234), (16.1, 225.7), (7.8, 225.7), (3.5, 230), (11.8, 230), align=None)
    extrude(amount=CUT_EXTRUDE10_DEPTH, mode=Mode.SUBTRACT)


solid = Compound([body_4.part, body_2_1.part])
